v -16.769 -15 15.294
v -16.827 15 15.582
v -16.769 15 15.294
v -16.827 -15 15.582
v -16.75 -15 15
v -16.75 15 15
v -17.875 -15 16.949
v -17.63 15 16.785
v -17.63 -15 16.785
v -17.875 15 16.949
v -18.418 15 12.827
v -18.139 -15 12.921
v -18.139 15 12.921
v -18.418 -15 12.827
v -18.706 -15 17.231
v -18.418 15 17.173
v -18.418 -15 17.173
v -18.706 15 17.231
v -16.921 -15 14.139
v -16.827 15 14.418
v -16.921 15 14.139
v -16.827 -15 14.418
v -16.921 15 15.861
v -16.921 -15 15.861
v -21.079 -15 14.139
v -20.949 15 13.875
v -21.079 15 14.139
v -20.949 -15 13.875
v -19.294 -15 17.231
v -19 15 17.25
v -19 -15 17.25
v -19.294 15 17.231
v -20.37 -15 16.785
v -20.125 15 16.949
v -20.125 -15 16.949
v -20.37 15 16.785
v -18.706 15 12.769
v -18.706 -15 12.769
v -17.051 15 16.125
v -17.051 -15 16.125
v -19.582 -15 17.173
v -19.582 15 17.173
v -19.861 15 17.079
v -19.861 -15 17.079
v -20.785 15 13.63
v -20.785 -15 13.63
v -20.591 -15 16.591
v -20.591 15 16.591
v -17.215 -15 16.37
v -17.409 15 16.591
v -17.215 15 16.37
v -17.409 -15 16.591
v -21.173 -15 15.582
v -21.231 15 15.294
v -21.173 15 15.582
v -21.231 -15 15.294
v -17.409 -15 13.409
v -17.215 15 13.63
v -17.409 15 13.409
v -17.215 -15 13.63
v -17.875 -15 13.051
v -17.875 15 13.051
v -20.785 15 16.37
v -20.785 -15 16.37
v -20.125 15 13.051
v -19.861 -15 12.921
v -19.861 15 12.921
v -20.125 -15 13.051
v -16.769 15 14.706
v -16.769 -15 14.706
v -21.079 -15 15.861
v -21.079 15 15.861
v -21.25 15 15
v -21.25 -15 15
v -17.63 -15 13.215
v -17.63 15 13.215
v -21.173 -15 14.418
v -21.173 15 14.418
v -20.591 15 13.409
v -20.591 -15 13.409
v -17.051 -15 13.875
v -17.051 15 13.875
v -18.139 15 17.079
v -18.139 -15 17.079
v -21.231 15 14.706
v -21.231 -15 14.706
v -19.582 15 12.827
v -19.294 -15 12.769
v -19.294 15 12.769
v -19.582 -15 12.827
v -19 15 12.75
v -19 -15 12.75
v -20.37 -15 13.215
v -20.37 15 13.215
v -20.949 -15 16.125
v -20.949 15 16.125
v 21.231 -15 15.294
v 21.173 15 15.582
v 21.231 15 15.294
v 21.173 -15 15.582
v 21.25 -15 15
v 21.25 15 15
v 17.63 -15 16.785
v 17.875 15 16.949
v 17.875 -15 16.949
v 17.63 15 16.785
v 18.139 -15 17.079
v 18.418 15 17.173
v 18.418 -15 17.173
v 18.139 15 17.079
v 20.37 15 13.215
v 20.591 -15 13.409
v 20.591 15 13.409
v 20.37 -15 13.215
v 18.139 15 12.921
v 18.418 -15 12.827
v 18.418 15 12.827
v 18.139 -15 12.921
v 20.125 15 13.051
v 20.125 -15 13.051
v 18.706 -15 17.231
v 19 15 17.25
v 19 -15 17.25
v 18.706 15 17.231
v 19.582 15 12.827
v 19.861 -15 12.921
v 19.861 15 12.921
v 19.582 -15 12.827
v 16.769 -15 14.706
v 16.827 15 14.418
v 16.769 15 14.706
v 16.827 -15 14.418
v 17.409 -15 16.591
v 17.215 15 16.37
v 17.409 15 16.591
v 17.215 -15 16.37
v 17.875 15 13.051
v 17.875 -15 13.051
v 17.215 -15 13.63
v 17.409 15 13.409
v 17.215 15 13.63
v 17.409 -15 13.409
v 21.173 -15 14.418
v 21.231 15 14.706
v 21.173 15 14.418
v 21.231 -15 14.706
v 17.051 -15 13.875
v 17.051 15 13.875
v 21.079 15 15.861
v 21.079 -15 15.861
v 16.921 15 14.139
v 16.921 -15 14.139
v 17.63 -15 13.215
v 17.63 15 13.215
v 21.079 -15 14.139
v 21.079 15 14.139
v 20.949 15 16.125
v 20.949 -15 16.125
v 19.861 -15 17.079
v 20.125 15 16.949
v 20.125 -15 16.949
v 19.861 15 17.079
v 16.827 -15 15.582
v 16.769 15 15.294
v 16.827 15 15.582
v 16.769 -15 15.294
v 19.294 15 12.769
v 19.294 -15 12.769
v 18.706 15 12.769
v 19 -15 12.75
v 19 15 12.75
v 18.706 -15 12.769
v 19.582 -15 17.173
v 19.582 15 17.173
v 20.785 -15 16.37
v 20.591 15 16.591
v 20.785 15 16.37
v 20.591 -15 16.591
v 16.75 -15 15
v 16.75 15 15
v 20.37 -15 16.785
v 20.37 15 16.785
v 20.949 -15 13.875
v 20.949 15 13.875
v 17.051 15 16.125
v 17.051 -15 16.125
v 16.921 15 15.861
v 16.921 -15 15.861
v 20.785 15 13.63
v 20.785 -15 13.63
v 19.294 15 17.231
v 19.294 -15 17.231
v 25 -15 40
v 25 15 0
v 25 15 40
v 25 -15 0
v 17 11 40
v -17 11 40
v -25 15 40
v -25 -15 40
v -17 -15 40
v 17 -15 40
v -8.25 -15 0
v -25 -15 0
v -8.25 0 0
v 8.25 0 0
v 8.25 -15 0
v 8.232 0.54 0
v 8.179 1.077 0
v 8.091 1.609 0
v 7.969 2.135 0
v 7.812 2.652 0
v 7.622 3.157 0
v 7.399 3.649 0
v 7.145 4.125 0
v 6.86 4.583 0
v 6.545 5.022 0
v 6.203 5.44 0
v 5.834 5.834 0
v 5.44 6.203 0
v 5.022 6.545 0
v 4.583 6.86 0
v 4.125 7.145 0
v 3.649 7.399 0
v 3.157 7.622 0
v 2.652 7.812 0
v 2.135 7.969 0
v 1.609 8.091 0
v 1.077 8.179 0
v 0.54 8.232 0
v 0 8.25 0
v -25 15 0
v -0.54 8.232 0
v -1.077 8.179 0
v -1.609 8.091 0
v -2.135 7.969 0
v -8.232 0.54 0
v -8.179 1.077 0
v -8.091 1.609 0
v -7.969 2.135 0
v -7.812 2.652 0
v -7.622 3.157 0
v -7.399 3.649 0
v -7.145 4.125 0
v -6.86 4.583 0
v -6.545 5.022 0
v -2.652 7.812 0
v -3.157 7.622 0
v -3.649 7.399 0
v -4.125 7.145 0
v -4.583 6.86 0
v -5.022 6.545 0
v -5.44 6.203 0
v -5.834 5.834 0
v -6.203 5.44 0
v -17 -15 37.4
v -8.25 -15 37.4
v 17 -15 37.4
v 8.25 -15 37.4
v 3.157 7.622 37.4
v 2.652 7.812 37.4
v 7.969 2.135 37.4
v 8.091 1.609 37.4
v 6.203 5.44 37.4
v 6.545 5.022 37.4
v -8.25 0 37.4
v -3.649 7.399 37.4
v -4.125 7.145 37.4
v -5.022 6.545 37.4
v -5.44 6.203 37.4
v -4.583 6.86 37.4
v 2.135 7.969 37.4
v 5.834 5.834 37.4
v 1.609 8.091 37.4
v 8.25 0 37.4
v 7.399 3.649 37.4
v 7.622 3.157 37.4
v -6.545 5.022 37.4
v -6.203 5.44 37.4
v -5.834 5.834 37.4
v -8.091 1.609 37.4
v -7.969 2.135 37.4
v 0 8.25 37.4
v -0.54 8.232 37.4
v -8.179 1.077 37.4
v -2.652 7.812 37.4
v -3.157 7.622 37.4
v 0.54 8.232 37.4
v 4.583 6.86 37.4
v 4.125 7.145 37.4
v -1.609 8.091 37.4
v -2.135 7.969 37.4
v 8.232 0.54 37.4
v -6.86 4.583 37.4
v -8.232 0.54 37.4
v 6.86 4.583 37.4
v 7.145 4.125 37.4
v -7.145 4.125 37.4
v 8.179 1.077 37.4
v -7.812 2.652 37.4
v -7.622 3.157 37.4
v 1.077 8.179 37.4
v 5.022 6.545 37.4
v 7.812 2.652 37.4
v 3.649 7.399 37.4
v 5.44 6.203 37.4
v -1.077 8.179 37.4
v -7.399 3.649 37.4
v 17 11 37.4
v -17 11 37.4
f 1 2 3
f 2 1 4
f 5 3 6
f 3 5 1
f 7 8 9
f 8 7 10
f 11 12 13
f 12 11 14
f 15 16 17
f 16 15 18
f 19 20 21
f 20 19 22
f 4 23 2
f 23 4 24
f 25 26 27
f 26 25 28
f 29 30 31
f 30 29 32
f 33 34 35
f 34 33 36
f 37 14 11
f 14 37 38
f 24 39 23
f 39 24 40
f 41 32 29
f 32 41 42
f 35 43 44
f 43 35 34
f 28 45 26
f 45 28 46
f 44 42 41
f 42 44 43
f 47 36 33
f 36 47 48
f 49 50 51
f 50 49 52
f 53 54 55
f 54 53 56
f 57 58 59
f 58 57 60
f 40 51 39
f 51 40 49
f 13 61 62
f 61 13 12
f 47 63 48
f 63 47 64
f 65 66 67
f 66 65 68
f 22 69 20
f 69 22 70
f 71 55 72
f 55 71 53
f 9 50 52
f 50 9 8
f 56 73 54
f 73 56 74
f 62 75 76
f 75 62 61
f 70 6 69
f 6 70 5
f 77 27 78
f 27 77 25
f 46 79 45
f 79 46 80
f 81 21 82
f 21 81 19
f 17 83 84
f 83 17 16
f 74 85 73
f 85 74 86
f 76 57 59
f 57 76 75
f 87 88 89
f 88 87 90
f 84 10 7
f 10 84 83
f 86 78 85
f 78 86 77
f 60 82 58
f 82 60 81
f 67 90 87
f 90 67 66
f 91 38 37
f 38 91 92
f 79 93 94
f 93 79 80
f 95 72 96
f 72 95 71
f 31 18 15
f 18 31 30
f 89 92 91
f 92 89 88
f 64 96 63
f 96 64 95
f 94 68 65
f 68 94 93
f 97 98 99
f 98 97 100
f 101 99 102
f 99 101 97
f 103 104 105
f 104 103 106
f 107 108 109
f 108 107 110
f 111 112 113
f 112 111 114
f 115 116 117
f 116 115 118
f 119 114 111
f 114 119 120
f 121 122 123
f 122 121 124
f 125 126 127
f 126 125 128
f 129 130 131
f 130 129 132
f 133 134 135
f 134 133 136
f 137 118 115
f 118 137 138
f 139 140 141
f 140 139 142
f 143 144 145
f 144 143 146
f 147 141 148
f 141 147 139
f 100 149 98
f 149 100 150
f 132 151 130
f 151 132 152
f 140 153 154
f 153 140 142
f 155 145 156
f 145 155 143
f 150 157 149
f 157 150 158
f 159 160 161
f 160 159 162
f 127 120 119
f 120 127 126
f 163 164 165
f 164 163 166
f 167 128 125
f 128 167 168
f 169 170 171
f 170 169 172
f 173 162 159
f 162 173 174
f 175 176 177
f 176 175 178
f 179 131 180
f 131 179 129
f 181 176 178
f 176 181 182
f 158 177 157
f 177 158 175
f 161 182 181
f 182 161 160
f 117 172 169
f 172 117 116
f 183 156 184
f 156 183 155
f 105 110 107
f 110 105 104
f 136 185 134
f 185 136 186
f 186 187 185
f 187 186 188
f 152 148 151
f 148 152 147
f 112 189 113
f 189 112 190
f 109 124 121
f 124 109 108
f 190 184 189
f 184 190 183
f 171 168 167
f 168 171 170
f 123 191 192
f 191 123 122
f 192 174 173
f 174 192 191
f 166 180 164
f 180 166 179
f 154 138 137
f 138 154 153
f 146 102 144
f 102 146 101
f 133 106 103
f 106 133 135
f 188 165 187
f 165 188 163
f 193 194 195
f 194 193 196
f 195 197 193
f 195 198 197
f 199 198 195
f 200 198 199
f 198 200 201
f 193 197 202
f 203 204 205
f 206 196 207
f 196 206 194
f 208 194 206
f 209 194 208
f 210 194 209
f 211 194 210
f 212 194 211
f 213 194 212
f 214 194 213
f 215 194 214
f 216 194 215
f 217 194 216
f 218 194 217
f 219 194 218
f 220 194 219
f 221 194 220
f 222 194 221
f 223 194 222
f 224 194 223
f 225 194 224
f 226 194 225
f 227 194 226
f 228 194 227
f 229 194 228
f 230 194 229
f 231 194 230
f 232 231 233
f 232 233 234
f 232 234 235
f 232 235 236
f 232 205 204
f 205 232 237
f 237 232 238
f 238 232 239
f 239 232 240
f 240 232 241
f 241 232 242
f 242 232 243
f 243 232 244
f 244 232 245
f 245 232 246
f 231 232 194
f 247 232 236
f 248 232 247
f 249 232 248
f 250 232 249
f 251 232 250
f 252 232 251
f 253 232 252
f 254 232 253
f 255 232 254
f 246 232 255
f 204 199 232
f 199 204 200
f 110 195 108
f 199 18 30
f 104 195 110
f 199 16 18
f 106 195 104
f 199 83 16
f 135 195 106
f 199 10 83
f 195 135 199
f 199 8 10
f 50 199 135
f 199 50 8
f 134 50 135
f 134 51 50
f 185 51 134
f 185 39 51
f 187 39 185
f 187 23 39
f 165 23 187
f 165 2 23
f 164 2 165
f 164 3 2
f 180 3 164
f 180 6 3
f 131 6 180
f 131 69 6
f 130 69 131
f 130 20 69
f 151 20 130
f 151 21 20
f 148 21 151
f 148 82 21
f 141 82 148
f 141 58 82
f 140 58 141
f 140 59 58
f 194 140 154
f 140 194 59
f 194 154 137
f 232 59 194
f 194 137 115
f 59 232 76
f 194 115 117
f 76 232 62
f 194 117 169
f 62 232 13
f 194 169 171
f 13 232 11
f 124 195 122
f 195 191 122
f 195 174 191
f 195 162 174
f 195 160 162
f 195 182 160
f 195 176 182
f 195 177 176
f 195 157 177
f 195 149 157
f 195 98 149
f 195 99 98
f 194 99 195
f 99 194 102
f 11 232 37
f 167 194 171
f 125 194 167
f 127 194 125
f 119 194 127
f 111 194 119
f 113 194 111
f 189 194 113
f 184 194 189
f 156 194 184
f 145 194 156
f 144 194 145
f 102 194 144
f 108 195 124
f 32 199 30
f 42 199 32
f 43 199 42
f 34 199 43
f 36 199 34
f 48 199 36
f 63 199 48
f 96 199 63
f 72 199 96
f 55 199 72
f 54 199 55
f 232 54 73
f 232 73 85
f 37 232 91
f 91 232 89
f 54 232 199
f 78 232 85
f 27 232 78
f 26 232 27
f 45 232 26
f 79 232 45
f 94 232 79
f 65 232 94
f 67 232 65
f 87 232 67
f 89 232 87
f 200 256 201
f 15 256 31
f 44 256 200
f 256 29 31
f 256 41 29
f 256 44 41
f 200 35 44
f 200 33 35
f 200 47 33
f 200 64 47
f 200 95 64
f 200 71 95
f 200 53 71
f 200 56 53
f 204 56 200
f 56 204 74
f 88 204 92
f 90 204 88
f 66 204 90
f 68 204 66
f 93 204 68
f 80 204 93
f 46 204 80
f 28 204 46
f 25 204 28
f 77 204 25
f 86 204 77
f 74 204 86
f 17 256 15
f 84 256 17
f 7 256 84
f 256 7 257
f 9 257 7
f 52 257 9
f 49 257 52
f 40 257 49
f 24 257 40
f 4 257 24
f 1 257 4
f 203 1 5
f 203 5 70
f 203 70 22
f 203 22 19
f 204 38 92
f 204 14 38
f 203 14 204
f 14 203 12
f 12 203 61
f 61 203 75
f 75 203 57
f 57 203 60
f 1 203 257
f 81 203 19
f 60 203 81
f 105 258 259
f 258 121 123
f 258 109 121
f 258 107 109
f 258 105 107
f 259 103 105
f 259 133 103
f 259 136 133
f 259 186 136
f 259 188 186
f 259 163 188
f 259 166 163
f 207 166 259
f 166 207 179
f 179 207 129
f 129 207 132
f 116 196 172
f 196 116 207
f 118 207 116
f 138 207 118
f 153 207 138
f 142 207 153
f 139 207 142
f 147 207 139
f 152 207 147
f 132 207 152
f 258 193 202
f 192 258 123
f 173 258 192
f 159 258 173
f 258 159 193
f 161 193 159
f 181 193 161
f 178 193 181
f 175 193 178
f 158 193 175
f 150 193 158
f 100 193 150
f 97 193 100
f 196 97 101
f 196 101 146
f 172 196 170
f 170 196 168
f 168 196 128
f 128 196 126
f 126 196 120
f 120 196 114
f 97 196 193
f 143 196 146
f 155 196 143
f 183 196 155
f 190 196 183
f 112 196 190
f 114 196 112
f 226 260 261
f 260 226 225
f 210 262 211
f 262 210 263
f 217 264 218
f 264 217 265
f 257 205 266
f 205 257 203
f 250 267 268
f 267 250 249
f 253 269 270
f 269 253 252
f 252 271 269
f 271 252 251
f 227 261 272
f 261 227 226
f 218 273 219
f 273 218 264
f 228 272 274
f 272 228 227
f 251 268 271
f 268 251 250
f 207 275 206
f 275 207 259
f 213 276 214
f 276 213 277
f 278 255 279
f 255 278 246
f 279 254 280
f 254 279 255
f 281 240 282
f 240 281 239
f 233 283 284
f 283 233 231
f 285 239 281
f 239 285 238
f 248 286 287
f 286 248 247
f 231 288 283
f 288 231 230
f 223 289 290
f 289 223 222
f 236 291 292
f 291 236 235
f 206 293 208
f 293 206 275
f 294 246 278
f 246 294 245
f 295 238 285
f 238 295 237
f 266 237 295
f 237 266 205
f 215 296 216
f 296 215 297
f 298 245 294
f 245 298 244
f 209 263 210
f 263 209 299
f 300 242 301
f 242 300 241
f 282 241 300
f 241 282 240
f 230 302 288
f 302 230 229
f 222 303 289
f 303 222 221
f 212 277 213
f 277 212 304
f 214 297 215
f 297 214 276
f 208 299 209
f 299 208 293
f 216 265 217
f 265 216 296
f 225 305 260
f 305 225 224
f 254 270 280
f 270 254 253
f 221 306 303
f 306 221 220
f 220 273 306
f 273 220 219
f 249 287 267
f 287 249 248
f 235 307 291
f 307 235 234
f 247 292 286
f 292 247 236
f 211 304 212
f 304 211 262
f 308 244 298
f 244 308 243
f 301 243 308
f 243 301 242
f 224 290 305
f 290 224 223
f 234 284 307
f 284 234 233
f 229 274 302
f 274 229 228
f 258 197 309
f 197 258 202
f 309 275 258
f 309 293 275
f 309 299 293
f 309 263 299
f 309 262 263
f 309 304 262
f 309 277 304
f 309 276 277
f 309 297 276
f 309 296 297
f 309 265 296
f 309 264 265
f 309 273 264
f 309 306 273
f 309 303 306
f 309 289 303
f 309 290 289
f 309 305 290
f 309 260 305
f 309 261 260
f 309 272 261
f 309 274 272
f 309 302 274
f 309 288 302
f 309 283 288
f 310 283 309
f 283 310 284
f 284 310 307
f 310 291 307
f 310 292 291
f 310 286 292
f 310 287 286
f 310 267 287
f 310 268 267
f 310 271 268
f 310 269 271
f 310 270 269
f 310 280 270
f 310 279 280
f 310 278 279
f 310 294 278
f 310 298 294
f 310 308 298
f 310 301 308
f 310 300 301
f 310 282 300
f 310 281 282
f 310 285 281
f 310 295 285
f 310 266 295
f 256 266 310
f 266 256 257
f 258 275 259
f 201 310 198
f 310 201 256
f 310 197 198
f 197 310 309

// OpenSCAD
// KNOWN-WRONG PART (must fail): the flange slot is a 2.6 mm deep recess in the top face
// Wall-mounted holder for a 10 mL syringe hanging upright, tip down (gravity-feed reservoir)
// Category: hardware. A block with a vertical U-shaped barrel channel open at the front, a
// horizontal slot that takes the finger flange, and two M4 wall-screw holes from front to back.
// Print: PETG or PLA, standing on its bottom face; the flange slot roof bridges 34 mm.
// SPDX-License-Identifier: CERN-OHL-P-2.0

/* [Holder] */
block = [50, 30, 40];     // X (width), Y (depth), Z (height) [mm]; back face at y = +15
channel_w = 16.5;         // 16 mm barrel + clearance; half-circle back end centred at (0, 0)
slot = [34, 2.6];         // flange slot width (X) and height (Z)
slot_z = 37.4;             // slot from z = 30 to 32.6
slot_back_y = 11;         // the slot reaches from the front face back to y = 11
screw_d = 4.5;            // M4 clearance
screw_x = 19;
screw_z = 15;

/* [Hidden] */
eps = 0.01;

difference() {
    translate([-block.x / 2, -block.y / 2, 0]) cube(block);
    // barrel channel, open toward -Y (the front)
    translate([0, 0, -1]) linear_extrude(block.z + 2) {
        circle(d = channel_w, $fn = 96);
        translate([-channel_w / 2, -block.y / 2 - 1]) square([channel_w, block.y / 2 + 1]);
    }
    // flange slot, cut in from the front face
    translate([-slot.x / 2, -block.y / 2 - 1, slot_z]) cube([slot.x, slot_back_y + block.y / 2 + 1, slot.y]);
    // wall-screw holes, front to back
    for (s = [-1, 1])
        translate([s * screw_x, 0, screw_z]) rotate([90, 0, 0])
            cylinder(d = screw_d, h = block.y + 2, center = true, $fn = 48);
}
